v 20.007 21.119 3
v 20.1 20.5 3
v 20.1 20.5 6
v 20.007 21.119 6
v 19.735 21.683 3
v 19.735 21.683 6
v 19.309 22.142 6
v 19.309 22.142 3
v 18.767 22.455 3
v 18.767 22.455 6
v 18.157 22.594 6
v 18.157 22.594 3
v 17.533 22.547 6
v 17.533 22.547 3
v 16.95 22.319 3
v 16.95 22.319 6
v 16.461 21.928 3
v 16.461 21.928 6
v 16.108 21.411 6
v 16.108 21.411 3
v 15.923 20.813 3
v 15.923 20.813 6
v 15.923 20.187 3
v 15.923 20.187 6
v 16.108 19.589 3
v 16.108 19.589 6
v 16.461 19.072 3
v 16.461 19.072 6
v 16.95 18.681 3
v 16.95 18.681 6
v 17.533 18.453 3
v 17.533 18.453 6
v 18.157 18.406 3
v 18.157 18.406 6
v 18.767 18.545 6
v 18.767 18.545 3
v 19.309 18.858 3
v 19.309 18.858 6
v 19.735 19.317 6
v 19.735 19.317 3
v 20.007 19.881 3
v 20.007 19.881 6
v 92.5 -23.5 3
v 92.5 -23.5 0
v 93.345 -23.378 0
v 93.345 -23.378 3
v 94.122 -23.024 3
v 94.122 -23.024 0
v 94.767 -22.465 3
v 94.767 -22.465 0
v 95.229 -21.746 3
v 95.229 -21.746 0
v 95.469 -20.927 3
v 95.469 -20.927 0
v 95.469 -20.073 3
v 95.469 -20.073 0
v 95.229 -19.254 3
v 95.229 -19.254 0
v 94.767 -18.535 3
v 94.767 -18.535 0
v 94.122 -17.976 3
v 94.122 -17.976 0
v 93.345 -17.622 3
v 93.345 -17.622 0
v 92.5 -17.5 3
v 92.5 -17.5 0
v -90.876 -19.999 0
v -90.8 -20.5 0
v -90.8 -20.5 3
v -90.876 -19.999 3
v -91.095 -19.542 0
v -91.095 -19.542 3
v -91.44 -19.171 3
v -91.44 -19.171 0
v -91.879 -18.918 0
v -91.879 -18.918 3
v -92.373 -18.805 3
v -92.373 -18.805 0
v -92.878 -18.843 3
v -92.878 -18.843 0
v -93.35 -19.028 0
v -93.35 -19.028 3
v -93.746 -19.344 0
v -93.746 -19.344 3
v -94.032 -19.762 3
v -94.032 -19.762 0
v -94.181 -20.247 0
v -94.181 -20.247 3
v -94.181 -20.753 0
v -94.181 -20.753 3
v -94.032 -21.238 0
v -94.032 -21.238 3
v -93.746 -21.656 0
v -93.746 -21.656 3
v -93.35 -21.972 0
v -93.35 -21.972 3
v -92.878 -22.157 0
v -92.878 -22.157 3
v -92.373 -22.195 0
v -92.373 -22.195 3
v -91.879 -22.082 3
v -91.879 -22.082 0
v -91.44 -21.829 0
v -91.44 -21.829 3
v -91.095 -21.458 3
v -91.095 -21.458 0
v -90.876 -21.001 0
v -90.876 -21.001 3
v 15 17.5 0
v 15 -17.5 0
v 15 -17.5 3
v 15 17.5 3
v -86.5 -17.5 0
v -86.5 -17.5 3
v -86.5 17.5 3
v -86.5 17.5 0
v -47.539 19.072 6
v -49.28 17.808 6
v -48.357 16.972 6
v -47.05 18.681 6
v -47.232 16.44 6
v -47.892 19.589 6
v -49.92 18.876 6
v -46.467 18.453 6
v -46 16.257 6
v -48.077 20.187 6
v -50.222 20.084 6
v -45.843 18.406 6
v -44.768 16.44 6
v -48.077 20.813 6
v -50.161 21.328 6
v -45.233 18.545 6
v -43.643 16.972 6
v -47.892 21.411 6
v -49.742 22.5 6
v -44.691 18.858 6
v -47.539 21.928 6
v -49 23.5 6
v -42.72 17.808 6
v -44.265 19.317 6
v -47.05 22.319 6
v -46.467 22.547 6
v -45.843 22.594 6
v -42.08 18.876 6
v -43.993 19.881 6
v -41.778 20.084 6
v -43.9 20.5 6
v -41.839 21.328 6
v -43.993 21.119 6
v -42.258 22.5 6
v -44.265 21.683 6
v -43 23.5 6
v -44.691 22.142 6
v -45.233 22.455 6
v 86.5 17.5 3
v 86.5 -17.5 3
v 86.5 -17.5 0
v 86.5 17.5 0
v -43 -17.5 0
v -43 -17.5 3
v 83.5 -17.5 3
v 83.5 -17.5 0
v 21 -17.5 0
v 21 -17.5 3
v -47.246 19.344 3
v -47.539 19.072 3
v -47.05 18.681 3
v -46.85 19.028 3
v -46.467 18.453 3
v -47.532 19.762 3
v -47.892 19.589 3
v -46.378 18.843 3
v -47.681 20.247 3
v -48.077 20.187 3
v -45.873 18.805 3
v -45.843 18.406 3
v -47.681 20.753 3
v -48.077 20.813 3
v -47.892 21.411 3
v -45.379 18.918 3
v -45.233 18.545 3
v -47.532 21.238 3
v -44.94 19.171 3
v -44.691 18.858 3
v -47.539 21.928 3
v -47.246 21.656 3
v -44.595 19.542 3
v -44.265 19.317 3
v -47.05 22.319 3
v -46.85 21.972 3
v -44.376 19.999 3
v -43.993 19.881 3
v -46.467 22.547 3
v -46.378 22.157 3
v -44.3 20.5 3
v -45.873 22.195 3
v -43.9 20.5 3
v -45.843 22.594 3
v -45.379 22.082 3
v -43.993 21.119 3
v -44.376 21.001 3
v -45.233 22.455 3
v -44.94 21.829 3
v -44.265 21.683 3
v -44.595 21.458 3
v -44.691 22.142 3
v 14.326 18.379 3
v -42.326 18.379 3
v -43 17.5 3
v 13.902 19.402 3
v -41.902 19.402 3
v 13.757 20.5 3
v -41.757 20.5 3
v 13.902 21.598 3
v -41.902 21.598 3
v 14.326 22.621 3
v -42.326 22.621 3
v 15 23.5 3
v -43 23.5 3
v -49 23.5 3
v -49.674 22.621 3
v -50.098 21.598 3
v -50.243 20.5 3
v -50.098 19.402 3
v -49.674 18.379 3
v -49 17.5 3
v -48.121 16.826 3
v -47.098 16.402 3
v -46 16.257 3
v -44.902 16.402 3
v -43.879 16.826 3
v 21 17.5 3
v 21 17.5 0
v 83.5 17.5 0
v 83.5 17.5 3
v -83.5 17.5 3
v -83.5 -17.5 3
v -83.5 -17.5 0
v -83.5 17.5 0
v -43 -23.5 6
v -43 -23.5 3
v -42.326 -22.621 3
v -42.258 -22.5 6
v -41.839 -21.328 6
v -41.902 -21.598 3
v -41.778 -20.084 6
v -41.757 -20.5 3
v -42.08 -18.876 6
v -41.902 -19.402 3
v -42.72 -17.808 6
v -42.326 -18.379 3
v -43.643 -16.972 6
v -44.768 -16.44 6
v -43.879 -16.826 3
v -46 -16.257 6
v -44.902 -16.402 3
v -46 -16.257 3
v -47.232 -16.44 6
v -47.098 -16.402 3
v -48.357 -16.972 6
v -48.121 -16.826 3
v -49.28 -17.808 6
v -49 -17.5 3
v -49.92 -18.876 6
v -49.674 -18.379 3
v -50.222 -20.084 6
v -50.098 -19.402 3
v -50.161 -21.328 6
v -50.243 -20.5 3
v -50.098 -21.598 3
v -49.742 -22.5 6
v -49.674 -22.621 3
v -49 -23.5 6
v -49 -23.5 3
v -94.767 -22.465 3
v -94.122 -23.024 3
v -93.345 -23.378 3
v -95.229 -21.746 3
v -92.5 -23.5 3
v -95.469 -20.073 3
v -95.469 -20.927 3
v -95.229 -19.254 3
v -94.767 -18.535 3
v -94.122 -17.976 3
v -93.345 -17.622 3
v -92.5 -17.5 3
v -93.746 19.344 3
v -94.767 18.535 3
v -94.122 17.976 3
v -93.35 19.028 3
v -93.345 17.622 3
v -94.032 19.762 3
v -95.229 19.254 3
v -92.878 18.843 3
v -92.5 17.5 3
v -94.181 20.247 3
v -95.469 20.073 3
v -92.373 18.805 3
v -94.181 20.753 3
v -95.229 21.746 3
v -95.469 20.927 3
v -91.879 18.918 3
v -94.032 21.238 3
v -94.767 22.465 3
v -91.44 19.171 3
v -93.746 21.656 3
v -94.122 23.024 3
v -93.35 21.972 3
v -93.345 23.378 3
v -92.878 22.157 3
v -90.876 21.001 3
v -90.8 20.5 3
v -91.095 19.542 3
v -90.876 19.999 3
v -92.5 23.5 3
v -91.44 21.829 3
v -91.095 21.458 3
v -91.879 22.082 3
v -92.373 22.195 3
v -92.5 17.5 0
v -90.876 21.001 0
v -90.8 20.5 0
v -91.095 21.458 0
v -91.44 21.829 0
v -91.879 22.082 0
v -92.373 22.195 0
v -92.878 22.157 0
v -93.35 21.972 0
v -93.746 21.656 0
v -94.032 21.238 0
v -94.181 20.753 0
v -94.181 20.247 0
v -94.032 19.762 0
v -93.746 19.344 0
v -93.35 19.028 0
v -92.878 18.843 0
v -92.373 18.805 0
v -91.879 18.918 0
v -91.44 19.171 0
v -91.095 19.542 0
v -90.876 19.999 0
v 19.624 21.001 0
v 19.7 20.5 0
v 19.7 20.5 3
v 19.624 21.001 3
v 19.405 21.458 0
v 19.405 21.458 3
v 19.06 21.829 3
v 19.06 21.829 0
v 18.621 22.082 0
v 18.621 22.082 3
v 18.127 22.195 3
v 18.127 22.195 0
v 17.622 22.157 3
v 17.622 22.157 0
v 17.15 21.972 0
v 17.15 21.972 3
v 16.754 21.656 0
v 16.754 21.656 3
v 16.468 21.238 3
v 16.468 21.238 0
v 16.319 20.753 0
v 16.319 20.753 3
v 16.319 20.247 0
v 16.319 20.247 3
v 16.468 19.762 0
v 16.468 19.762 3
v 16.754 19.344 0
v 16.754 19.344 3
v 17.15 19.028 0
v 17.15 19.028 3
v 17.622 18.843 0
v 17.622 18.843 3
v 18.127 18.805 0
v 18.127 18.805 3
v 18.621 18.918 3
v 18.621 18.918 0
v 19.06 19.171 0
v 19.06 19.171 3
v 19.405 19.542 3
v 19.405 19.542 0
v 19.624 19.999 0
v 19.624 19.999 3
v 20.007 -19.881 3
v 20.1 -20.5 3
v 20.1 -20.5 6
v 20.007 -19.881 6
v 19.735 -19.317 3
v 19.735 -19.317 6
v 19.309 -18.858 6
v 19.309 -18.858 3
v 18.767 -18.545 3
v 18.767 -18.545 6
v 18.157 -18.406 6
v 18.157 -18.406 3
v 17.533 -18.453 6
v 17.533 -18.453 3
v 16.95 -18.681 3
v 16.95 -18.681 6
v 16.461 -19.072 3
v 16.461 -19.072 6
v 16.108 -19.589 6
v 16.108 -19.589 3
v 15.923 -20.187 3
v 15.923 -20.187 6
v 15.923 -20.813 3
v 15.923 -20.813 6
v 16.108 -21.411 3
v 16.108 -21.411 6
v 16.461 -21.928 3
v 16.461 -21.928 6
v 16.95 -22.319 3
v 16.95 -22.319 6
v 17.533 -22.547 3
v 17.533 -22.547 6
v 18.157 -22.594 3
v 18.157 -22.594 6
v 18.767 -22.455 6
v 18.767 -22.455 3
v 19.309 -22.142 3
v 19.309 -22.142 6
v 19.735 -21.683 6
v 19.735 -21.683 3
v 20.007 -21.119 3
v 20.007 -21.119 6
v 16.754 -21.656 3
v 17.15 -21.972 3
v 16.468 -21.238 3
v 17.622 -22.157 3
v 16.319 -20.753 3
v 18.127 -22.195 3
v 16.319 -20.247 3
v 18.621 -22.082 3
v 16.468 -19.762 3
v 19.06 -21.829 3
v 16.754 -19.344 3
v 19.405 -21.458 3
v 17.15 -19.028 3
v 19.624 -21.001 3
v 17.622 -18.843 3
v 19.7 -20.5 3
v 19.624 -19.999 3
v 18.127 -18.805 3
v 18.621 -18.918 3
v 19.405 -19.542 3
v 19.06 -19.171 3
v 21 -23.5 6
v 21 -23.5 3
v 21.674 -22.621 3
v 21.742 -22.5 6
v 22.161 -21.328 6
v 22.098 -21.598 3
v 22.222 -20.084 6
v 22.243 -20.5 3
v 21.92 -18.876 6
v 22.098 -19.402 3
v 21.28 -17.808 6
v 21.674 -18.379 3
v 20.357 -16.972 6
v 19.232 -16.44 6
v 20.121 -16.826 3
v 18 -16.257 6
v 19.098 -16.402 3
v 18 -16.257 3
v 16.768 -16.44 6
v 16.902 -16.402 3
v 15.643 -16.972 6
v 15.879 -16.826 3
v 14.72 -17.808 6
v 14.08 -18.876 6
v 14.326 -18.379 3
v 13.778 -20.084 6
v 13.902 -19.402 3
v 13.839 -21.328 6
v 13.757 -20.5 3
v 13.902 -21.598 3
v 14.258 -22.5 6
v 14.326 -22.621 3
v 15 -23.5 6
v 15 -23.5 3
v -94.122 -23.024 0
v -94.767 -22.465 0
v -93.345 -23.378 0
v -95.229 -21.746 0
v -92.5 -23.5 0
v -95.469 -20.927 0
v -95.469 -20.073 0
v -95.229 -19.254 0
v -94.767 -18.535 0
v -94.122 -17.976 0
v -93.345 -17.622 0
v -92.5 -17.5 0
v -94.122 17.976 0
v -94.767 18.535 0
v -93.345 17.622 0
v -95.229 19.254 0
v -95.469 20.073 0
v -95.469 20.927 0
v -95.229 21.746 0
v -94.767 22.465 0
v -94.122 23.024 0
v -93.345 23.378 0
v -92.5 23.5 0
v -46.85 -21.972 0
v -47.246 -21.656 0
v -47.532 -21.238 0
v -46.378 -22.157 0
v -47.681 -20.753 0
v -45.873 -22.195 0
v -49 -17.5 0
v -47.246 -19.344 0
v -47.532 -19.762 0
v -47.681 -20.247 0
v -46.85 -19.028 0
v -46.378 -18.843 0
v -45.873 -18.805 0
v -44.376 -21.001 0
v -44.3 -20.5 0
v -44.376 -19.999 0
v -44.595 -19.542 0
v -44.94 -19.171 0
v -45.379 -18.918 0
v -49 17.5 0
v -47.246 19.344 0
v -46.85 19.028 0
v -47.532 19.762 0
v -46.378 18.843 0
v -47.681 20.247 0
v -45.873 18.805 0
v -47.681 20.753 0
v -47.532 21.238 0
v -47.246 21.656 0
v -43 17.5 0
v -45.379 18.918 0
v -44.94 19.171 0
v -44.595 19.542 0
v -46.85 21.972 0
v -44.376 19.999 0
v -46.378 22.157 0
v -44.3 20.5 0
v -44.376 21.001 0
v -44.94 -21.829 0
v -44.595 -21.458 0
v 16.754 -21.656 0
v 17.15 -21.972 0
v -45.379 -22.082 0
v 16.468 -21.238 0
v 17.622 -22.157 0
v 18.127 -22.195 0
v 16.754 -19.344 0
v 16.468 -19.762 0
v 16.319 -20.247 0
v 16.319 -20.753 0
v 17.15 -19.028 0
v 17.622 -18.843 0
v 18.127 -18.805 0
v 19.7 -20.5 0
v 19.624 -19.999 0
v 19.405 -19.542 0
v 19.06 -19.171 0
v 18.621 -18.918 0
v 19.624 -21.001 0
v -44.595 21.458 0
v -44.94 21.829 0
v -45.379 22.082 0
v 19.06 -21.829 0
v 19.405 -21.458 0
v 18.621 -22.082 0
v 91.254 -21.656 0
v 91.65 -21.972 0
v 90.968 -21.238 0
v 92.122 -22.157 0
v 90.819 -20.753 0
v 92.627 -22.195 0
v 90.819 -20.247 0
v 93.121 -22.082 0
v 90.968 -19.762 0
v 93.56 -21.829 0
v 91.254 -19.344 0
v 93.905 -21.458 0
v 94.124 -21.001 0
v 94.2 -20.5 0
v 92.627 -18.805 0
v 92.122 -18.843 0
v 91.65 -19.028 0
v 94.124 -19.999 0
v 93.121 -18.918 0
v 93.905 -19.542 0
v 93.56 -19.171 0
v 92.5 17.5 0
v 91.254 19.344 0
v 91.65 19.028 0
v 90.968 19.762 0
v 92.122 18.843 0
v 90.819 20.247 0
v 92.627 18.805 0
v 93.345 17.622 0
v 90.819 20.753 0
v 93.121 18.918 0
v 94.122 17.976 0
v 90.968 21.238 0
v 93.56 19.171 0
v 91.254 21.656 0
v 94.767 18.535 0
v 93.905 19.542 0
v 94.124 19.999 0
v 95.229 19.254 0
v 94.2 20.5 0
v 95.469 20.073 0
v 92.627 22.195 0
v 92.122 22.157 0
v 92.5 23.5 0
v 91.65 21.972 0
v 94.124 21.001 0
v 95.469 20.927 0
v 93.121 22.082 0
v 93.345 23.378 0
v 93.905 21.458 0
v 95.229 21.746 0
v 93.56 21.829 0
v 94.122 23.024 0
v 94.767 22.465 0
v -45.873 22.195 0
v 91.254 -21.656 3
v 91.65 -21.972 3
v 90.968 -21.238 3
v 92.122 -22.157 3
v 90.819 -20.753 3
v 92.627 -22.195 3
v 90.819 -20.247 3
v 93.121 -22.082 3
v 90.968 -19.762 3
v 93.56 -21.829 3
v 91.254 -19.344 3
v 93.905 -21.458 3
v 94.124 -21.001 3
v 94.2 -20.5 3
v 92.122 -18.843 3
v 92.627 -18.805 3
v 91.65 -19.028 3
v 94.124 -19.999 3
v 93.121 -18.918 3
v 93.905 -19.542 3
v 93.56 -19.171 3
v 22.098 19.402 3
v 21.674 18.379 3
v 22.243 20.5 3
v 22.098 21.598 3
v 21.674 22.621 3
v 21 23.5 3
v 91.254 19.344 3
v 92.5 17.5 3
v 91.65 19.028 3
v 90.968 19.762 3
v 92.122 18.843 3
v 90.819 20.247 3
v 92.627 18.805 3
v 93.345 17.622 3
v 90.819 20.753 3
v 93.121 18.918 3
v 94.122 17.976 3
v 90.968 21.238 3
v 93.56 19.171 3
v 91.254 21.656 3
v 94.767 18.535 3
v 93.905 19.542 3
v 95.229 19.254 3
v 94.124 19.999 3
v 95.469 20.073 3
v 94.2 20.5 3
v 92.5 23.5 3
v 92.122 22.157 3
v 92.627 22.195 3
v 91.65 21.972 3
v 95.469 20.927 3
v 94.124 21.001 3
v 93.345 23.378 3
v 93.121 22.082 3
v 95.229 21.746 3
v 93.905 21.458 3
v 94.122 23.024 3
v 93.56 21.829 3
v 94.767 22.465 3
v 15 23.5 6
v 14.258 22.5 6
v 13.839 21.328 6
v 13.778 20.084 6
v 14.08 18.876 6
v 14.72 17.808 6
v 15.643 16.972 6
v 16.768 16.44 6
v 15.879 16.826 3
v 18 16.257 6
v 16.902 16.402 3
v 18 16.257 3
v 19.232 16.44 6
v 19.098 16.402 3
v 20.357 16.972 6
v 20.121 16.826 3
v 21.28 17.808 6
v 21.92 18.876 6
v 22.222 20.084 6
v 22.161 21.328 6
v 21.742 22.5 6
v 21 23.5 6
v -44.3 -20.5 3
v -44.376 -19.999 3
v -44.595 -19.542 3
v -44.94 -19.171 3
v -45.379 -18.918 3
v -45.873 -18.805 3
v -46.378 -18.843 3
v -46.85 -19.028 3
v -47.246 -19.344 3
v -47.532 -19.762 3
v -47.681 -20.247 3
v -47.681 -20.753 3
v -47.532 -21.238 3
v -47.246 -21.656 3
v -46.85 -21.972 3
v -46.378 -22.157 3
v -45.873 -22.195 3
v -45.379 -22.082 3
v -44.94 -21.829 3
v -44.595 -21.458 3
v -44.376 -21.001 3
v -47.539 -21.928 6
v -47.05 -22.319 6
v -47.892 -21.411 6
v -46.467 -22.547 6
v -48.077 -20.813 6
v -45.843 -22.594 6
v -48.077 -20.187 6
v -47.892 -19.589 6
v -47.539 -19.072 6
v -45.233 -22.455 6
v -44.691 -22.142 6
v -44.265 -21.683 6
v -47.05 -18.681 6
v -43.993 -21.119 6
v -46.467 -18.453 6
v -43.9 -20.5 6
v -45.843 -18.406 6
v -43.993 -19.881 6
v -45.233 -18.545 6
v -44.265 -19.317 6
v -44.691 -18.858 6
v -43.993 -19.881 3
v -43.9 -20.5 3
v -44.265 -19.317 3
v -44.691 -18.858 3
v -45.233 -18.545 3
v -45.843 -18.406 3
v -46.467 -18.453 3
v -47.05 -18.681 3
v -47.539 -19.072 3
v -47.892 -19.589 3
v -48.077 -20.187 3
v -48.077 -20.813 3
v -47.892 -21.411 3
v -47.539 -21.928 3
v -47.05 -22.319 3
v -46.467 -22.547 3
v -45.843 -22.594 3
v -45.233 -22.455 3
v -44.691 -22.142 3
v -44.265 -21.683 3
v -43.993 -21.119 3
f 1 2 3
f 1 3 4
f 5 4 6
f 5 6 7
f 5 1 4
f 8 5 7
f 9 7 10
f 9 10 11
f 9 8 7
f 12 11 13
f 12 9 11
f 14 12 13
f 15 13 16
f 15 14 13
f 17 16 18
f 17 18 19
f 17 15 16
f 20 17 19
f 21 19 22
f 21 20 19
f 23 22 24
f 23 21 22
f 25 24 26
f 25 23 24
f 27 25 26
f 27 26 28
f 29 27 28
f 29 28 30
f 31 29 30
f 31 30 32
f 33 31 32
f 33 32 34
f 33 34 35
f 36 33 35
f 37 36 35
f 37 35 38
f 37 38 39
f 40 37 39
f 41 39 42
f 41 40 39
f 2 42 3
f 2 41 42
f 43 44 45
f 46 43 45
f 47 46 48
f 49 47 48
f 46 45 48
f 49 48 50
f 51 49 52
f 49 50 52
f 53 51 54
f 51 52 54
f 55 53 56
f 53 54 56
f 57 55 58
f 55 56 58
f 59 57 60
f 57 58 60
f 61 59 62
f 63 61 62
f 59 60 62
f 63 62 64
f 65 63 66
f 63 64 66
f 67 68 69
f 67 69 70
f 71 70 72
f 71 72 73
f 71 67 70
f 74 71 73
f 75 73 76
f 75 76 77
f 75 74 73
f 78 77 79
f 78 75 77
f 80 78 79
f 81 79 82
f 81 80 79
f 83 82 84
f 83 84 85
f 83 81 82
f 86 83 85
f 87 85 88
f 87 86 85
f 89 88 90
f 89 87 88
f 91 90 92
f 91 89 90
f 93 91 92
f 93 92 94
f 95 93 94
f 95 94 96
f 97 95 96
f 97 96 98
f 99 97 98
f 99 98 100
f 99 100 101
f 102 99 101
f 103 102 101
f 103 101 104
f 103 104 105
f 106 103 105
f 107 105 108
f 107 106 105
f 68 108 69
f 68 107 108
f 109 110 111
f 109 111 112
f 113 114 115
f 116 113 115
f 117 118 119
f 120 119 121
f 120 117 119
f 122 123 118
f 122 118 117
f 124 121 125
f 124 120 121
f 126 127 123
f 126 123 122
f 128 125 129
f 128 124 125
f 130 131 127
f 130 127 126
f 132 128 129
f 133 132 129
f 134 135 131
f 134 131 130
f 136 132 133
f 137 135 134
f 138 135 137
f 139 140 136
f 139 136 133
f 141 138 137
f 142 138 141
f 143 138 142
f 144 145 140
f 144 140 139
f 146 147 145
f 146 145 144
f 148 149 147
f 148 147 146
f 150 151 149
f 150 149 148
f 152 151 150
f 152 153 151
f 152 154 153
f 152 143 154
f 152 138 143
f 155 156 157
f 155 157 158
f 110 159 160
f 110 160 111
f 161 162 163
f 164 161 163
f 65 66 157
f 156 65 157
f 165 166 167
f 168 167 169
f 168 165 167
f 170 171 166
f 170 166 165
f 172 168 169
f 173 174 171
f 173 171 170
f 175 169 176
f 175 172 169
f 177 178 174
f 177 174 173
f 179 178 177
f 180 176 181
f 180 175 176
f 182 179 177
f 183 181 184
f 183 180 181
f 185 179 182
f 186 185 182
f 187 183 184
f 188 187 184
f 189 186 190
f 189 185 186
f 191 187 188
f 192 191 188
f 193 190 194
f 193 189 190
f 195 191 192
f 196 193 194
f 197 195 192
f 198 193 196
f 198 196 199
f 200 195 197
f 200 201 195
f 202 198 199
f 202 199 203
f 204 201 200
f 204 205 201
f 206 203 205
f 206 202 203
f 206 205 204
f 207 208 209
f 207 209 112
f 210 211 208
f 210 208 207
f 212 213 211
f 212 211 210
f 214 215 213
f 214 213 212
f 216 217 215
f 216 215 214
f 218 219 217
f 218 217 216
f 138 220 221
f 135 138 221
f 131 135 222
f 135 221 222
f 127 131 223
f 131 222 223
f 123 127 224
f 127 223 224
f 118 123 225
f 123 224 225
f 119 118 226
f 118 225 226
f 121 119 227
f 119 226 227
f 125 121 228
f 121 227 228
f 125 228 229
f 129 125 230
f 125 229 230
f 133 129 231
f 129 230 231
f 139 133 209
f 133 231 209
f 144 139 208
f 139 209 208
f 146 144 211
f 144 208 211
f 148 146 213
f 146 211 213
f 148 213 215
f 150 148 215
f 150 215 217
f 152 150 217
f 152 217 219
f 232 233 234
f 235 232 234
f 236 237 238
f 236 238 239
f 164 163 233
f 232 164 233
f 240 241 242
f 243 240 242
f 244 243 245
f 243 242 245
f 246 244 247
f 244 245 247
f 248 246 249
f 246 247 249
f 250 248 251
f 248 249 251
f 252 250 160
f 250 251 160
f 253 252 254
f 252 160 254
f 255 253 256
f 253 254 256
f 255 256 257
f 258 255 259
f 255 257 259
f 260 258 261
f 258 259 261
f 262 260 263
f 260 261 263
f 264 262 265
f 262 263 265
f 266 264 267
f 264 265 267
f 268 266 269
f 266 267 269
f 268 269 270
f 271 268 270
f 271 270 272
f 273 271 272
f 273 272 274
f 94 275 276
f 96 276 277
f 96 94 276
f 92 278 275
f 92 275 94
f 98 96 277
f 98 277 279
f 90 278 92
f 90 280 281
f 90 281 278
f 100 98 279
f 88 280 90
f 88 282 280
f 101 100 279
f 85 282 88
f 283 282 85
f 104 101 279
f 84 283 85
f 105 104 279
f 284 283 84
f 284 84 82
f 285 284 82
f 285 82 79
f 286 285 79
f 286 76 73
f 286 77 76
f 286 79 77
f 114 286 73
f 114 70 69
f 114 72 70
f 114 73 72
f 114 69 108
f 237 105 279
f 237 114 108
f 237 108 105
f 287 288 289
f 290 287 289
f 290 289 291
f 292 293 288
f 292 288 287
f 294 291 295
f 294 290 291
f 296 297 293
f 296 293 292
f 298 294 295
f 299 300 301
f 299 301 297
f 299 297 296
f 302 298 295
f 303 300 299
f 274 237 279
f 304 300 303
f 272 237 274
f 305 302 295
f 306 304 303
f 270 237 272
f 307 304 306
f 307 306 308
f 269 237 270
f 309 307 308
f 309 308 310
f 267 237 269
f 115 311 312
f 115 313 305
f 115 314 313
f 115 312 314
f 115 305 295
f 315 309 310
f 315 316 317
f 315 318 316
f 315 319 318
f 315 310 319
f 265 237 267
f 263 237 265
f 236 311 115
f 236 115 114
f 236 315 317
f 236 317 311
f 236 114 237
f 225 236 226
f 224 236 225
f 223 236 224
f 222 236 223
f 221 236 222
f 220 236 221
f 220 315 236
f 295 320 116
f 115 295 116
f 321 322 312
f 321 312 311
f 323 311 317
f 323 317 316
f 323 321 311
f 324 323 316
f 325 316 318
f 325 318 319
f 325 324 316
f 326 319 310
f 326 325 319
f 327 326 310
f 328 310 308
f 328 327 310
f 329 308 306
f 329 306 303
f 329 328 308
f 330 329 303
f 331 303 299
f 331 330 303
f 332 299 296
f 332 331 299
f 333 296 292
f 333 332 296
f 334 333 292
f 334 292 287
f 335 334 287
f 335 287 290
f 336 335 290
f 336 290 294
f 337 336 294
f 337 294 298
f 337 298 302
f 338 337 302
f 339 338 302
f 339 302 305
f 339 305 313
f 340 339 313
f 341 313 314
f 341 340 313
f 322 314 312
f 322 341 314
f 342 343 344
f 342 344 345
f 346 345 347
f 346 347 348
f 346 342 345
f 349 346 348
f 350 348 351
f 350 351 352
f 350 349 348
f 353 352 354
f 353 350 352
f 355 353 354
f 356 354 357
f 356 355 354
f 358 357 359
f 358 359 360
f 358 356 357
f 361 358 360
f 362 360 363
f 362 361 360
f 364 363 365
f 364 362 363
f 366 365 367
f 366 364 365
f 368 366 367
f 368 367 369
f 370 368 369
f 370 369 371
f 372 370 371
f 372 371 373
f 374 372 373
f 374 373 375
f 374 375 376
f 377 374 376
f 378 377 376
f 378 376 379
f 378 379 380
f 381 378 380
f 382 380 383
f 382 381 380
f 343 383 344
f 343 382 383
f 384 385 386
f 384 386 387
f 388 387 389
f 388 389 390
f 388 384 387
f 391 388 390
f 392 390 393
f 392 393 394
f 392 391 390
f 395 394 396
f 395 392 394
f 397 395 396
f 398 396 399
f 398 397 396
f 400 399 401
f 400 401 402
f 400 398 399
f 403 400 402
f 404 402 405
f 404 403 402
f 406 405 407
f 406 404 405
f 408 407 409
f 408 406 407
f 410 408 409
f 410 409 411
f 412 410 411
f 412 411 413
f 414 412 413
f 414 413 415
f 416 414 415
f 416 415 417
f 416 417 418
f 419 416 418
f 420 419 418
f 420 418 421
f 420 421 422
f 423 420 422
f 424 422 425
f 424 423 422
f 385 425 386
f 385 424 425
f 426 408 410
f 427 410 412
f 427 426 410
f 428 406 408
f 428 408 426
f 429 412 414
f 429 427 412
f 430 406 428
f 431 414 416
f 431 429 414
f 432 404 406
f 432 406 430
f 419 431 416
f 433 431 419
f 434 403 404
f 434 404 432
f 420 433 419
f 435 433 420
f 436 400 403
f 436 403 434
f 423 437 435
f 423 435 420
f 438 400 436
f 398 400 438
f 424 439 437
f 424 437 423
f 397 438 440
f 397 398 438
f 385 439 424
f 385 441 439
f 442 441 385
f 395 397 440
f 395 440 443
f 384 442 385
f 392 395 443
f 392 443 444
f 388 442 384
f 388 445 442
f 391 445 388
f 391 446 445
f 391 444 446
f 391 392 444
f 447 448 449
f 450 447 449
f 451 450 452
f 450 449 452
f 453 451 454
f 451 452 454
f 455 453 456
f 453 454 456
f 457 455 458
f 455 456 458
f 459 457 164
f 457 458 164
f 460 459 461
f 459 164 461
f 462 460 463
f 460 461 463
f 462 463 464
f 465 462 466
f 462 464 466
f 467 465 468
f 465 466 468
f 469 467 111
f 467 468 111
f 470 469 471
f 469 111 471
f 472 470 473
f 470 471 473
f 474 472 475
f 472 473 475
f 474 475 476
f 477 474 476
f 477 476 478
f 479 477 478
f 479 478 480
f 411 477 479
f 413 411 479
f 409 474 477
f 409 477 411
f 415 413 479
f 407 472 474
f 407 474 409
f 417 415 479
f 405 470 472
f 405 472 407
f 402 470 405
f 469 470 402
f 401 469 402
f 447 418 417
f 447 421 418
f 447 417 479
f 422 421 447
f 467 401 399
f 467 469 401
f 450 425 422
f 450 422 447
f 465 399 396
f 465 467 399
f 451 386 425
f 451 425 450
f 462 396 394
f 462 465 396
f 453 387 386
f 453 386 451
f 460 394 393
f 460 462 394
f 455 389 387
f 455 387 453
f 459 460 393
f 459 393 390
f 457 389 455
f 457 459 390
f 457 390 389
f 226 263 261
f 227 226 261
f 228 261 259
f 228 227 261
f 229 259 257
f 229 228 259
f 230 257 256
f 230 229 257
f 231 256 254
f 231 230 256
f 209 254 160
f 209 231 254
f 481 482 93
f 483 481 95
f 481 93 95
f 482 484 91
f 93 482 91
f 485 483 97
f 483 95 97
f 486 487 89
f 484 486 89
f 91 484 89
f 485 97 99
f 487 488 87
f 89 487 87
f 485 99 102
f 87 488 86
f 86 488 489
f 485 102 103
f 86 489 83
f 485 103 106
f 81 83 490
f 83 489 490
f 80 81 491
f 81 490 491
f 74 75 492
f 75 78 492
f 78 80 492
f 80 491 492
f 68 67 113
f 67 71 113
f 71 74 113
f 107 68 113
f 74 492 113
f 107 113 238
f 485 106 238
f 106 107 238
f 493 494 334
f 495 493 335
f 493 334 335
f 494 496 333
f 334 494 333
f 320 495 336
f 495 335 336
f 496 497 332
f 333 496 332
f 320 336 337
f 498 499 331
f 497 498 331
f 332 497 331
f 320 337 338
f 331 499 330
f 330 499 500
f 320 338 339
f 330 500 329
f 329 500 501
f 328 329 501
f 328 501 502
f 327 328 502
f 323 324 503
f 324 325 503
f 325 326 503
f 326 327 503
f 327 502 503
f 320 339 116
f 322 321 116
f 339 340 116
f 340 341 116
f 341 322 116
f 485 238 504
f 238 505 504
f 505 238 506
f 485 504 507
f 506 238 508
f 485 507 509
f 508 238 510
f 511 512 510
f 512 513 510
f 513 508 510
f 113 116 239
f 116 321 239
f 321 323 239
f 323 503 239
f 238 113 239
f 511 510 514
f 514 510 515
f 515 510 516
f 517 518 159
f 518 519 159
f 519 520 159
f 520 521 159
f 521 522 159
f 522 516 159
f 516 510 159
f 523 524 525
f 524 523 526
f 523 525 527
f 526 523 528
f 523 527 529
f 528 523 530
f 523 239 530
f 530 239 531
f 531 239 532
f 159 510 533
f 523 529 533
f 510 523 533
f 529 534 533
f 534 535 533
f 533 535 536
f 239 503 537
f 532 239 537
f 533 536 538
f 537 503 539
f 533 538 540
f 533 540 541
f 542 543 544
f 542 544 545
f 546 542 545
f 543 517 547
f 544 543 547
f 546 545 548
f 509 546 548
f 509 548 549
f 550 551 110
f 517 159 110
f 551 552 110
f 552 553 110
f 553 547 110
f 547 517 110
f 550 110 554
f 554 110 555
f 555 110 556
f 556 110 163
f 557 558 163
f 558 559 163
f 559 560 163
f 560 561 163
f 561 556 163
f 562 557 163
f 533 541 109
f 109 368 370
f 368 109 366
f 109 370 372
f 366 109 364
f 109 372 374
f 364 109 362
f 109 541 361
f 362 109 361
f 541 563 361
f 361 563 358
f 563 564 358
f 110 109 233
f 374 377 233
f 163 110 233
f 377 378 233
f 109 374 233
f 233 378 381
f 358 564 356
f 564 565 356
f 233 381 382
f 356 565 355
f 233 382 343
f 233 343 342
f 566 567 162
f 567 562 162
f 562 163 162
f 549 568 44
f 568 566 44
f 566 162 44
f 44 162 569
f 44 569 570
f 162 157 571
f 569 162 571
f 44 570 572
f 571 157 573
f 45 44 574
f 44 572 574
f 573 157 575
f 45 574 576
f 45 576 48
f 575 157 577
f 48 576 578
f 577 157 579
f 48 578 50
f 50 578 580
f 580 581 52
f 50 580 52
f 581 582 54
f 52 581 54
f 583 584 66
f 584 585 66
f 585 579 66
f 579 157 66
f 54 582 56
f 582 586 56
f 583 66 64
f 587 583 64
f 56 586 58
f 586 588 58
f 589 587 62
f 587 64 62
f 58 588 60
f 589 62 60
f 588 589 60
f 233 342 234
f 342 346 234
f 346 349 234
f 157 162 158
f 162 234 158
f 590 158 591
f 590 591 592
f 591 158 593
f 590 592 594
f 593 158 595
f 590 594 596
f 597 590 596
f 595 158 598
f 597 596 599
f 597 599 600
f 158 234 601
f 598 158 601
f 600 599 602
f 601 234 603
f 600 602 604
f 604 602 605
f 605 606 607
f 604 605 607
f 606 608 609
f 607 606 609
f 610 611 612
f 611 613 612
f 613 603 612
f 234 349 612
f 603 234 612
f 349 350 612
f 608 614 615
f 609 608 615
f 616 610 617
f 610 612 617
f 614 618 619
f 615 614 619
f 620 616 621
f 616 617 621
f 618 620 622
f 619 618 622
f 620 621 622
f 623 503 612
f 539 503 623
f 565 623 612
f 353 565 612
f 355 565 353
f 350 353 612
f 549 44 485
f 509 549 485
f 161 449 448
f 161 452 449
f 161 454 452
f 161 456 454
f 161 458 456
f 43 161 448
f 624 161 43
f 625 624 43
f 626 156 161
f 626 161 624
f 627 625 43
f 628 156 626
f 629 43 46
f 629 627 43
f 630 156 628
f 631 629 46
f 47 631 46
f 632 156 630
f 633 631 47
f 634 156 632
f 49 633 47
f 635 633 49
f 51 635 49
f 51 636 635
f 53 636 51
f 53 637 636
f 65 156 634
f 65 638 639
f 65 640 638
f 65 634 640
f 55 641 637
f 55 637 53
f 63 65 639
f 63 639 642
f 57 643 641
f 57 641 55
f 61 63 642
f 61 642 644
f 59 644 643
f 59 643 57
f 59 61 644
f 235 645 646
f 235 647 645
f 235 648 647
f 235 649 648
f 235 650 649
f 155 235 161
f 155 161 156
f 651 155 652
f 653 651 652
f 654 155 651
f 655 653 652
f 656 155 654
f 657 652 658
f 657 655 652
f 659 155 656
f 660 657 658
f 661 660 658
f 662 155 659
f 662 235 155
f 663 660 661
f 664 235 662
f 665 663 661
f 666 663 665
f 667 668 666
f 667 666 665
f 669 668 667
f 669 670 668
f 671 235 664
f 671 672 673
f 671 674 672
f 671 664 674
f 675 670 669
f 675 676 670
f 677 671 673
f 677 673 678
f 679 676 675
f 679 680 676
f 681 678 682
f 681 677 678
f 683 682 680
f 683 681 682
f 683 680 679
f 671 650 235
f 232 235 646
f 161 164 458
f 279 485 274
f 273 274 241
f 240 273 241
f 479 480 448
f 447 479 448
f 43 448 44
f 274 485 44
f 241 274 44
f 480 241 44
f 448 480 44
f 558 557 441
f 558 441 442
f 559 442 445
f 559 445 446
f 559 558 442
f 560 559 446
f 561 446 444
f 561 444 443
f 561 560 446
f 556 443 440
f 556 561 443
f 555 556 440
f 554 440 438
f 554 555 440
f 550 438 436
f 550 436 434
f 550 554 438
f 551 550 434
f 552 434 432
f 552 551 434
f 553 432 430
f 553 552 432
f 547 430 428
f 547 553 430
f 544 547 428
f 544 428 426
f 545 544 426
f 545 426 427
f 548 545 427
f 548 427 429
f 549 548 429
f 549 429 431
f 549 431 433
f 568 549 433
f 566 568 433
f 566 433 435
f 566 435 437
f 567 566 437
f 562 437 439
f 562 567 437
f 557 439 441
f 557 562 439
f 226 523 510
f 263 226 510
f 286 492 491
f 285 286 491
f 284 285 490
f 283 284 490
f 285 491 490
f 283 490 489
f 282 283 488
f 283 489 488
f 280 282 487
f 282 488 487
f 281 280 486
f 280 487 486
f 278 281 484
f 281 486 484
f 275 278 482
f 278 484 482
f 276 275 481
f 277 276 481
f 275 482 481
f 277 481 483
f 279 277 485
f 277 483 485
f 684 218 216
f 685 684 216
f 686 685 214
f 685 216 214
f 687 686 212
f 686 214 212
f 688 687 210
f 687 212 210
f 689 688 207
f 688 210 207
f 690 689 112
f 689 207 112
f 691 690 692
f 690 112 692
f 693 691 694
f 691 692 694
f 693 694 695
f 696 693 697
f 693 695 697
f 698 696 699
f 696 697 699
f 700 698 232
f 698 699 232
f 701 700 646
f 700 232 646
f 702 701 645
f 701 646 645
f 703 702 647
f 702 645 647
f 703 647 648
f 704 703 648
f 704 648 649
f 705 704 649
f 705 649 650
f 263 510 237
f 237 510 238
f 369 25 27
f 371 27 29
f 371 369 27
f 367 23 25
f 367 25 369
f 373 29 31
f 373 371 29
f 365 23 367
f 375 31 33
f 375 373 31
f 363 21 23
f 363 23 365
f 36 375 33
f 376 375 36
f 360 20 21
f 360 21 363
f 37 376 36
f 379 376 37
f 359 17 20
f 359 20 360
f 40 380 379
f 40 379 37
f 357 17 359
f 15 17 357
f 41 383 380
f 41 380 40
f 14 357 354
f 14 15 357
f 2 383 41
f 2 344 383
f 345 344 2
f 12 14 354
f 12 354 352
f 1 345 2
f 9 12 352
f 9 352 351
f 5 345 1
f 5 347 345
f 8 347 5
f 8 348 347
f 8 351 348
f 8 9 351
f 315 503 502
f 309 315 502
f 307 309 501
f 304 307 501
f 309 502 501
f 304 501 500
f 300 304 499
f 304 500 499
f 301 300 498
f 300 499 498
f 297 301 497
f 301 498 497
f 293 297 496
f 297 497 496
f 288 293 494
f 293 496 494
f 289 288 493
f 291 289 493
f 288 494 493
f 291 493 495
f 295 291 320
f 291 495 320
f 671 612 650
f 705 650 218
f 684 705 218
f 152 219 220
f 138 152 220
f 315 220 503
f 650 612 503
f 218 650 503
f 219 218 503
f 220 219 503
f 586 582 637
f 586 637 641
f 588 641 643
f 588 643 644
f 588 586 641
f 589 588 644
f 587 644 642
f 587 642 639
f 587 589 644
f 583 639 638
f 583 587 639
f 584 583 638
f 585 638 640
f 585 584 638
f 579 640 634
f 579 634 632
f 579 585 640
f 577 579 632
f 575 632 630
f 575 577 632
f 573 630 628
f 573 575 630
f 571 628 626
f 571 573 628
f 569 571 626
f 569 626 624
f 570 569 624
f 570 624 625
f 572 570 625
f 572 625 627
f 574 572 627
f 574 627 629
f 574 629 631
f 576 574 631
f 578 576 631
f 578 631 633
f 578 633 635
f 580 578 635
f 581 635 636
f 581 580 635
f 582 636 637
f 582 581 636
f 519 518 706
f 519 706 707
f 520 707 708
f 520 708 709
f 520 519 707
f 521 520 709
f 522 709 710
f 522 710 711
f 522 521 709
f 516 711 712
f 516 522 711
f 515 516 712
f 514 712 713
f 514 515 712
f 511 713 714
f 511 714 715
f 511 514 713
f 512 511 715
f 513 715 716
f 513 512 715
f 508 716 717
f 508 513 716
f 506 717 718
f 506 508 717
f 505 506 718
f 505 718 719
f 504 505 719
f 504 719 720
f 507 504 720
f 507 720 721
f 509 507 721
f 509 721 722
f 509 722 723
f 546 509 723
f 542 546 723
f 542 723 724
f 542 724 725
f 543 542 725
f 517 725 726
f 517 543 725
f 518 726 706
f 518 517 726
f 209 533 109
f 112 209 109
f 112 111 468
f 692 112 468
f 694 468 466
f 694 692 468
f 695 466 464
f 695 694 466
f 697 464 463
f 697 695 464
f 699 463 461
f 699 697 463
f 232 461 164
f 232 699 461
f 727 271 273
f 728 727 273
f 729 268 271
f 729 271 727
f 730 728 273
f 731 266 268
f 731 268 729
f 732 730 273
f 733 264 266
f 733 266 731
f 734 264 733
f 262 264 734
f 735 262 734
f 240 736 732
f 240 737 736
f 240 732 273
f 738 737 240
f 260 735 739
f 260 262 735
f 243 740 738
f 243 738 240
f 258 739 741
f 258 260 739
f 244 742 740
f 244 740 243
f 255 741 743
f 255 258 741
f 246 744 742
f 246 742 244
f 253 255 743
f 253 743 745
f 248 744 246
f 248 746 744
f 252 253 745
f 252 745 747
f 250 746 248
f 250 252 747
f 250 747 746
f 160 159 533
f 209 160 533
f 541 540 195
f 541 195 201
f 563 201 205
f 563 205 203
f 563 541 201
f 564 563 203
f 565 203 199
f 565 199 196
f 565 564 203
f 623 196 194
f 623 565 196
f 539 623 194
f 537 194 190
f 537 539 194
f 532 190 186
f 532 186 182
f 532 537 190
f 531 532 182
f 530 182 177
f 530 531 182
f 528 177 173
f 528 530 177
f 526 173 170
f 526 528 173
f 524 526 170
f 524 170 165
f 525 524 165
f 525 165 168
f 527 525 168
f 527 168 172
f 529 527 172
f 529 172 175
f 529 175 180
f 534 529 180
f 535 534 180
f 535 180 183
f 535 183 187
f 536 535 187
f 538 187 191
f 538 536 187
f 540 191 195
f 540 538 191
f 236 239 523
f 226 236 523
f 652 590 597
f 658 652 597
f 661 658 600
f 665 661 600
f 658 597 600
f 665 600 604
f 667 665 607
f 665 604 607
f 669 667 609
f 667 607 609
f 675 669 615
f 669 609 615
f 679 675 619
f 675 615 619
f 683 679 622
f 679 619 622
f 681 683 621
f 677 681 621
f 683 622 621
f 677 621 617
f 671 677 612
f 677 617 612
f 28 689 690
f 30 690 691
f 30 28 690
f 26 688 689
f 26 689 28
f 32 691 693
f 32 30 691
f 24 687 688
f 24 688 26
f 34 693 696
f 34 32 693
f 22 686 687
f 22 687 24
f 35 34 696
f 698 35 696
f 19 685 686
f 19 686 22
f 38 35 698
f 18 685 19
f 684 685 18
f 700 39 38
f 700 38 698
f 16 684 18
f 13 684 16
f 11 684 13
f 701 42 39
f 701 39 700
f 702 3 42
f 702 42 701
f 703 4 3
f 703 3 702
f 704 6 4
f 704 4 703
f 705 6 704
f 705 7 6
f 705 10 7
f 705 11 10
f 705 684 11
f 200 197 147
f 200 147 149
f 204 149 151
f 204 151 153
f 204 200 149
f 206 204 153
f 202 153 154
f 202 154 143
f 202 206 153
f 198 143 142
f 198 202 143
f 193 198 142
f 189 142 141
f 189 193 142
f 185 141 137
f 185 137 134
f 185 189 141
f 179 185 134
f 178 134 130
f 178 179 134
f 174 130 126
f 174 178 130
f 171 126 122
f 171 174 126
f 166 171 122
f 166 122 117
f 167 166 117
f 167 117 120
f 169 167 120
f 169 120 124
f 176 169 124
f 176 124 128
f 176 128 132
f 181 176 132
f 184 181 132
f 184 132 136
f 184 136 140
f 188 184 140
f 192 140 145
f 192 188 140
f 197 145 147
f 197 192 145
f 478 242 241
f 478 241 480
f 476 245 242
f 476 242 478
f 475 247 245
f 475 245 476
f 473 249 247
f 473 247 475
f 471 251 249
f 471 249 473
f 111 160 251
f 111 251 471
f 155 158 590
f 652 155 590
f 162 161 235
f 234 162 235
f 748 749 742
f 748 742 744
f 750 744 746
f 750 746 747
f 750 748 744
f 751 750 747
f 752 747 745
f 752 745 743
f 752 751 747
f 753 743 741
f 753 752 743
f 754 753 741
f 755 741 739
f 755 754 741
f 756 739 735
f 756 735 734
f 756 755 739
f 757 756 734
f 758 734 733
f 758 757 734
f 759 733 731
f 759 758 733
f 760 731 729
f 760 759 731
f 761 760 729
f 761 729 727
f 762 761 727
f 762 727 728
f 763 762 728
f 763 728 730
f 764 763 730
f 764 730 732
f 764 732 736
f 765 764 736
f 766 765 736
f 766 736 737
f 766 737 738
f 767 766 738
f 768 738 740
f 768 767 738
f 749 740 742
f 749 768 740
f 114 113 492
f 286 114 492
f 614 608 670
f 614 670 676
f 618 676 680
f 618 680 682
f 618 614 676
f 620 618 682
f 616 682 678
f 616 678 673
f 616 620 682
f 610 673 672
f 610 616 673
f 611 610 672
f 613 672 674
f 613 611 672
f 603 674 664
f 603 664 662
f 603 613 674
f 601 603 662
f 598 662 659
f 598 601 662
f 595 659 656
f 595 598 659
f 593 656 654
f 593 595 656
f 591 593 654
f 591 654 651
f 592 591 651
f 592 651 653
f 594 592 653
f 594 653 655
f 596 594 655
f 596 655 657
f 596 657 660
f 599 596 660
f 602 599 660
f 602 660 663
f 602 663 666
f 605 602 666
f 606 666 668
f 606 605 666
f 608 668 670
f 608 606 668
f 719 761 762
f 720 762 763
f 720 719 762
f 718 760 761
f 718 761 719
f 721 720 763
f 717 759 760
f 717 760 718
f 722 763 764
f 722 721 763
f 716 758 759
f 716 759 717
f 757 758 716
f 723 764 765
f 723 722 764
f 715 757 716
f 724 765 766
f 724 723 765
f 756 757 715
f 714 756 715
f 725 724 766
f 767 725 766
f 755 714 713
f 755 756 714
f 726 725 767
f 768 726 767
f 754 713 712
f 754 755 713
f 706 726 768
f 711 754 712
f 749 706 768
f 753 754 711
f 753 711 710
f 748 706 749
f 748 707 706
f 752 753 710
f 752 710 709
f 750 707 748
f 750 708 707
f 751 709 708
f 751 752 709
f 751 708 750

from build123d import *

# Parameters (mm, degrees)
ESBO_O1_R                = 1.7
ESBO_O1_W                = 58
ESBO_O1_H                = 35
RESSALTO_EXTRUS_O1_DEPTH = 3
ESBO_O2_R                = 2.1
RESSALTO_EXTRUS_O2_DEPTH = 3
ESBO_O3_W                = 3
ESBO_O3_H                = 35
EXTRUS_O_FINA1_DEPTH     = 3


with BuildPart() as part:
    # Esboço1 → Ressalto-extrusão1 (new body)
    with BuildSketch(Plane.XY):
        with BuildLine():
            Line((92.5, 23.5), (-92.5, 23.5))
            ThreePointArc((-92.5, 23.5), (-95.5, 20.5), (-92.5, 17.5))
            Line((-92.5, 17.5), (-49, 17.5))
            Line((-49, 17.5), (-49, -17.5))
            Line((-49, -17.5), (-92.5, -17.5))
            ThreePointArc((-92.5, -17.5), (-95.5, -20.5), (-92.5, -23.5))
            Line((-92.5, -23.5), (92.5, -23.5))
            ThreePointArc((92.5, -23.5), (95.5, -20.5), (92.5, -17.5))
            Line((92.5, -17.5), (21, -17.5))
            Line((21, -17.5), (21, 17.5))
            Line((21, 17.5), (92.5, 17.5))
            ThreePointArc((92.5, 17.5), (95.5, 20.5), (92.5, 23.5))
        make_face()
        with Locations((-92.5, 20.5)):
            Circle(ESBO_O1_R, mode=Mode.SUBTRACT)
        with Locations((92.5, 20.5)):
            Circle(ESBO_O1_R, mode=Mode.SUBTRACT)
        with Locations((18, 20.5)):
            Circle(ESBO_O1_R, mode=Mode.SUBTRACT)
        with Locations((-46, 20.5)):
            Circle(ESBO_O1_R, mode=Mode.SUBTRACT)
        with Locations((-46, -20.5)):
            Circle(ESBO_O1_R, mode=Mode.SUBTRACT)
        with Locations((18, -20.5)):
            Circle(ESBO_O1_R, mode=Mode.SUBTRACT)
        with Locations((92.5, -20.5)):
            Circle(ESBO_O1_R, mode=Mode.SUBTRACT)
        with Locations((-92.5, -20.5)):
            Circle(ESBO_O1_R, mode=Mode.SUBTRACT)
        with Locations((-14, 0)):
            Rectangle(ESBO_O1_W, ESBO_O1_H, mode=Mode.SUBTRACT)
    extrude(amount=RESSALTO_EXTRUS_O1_DEPTH)

    # Esboço2 → Ressalto-extrusão2 (add)
    with BuildSketch(Plane.XY.offset(3)):
        with BuildLine():
            Line((21, 23.5), (15, 23.5))
            ThreePointArc((15, 23.5), (18, 16.257359313), (21, 23.5))
        make_face()
        with Locations((18, 20.5)):
            Circle(ESBO_O2_R, mode=Mode.SUBTRACT)
        with BuildLine():
            Line((-49, -23.5), (-43, -23.5))
            ThreePointArc((-43, -23.5), (-46, -16.257359313), (-49, -23.5))
        make_face()
        with Locations((-46, -20.5)):
            Circle(ESBO_O2_R, mode=Mode.SUBTRACT)
        with BuildLine():
            Line((-43, 23.5), (-49, 23.5))
            ThreePointArc((-49, 23.5), (-46, 16.257359313), (-43, 23.5))
        make_face()
        with Locations((-46, 20.5)):
            Circle(ESBO_O2_R, mode=Mode.SUBTRACT)
        with BuildLine():
            Line((15, -23.5), (21, -23.5))
            ThreePointArc((21, -23.5), (18, -16.257359313), (15, -23.5))
        make_face()
        with Locations((18, -20.5)):
            Circle(ESBO_O2_R, mode=Mode.SUBTRACT)
    extrude(amount=RESSALTO_EXTRUS_O2_DEPTH)

    # Esboço3 → Extrusão-Fina1 (add, through all)
    with BuildSketch(Plane.XY.offset(3)):
        with Locations((-85, 0)):
            Rectangle(ESBO_O3_W, ESBO_O3_H)
        with Locations((85, 0)):
            Rectangle(ESBO_O3_W, ESBO_O3_H)
    extrude(amount=-EXTRUS_O_FINA1_DEPTH)


solid = part.part
